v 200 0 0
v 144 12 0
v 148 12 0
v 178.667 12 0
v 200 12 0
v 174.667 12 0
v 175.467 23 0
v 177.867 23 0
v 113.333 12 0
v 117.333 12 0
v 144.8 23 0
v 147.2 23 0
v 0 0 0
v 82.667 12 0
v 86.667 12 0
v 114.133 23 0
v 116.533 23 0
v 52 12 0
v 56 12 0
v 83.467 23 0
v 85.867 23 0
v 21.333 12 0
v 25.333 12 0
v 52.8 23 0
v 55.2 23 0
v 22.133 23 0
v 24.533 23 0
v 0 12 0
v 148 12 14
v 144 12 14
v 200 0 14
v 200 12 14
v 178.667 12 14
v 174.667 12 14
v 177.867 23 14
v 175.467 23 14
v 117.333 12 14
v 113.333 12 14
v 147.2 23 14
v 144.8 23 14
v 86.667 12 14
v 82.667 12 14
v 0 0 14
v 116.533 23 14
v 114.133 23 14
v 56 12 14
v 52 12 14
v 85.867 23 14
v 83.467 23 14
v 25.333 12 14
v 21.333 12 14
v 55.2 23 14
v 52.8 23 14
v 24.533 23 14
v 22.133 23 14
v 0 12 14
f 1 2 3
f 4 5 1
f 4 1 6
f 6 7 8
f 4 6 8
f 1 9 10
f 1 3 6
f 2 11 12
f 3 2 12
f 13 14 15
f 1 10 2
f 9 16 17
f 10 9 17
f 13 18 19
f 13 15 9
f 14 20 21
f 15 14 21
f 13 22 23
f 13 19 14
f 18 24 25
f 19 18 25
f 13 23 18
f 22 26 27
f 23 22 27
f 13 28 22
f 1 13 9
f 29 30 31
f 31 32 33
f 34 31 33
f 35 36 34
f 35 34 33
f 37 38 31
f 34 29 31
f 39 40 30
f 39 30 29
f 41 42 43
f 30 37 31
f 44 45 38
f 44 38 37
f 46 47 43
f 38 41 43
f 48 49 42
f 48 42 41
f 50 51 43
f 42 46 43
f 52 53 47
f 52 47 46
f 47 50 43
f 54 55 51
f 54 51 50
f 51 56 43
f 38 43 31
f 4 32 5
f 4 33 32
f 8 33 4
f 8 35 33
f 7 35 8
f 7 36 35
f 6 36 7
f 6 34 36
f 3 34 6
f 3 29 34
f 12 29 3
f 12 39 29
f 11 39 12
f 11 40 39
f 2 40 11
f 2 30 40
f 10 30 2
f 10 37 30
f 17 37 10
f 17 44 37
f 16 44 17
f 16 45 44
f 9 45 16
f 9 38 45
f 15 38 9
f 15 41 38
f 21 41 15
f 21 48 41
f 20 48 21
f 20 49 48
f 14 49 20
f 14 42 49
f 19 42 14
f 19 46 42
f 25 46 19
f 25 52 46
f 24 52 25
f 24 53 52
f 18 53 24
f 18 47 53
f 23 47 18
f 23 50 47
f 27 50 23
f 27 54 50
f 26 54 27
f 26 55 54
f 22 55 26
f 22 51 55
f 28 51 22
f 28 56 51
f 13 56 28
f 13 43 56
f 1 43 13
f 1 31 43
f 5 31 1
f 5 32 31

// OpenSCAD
$fn = 32;

// ----------------------------------------------------------------------
// Gear rack: 6 teeth on a 200 mm bar, pitch 30.67 mm
// ----------------------------------------------------------------------

// --- parameters (mm) ---
profile_height = 14;      // extrusion height
profile_points = 28;      // points of the closed outline

profile = [[0, 0], [200, 0], [200, 12], [178.667, 12], [177.867, 23], [175.467, 23], [174.667, 12], [148, 12], [147.2, 23], [144.8, 23], [144, 12], [117.333, 12], [116.533, 23], [114.133, 23], [113.333, 12], [86.667, 12], [85.867, 23], [83.467, 23], [82.667, 12], [56, 12], [55.2, 23], [52.8, 23], [52, 12], [25.333, 12], [24.533, 23], [22.133, 23], [21.333, 12], [0, 12]];  // single closed polygon, 28 points, counter clockwise

// --- the one profile operation ---
linear_extrude(height = profile_height) polygon(points = profile);
